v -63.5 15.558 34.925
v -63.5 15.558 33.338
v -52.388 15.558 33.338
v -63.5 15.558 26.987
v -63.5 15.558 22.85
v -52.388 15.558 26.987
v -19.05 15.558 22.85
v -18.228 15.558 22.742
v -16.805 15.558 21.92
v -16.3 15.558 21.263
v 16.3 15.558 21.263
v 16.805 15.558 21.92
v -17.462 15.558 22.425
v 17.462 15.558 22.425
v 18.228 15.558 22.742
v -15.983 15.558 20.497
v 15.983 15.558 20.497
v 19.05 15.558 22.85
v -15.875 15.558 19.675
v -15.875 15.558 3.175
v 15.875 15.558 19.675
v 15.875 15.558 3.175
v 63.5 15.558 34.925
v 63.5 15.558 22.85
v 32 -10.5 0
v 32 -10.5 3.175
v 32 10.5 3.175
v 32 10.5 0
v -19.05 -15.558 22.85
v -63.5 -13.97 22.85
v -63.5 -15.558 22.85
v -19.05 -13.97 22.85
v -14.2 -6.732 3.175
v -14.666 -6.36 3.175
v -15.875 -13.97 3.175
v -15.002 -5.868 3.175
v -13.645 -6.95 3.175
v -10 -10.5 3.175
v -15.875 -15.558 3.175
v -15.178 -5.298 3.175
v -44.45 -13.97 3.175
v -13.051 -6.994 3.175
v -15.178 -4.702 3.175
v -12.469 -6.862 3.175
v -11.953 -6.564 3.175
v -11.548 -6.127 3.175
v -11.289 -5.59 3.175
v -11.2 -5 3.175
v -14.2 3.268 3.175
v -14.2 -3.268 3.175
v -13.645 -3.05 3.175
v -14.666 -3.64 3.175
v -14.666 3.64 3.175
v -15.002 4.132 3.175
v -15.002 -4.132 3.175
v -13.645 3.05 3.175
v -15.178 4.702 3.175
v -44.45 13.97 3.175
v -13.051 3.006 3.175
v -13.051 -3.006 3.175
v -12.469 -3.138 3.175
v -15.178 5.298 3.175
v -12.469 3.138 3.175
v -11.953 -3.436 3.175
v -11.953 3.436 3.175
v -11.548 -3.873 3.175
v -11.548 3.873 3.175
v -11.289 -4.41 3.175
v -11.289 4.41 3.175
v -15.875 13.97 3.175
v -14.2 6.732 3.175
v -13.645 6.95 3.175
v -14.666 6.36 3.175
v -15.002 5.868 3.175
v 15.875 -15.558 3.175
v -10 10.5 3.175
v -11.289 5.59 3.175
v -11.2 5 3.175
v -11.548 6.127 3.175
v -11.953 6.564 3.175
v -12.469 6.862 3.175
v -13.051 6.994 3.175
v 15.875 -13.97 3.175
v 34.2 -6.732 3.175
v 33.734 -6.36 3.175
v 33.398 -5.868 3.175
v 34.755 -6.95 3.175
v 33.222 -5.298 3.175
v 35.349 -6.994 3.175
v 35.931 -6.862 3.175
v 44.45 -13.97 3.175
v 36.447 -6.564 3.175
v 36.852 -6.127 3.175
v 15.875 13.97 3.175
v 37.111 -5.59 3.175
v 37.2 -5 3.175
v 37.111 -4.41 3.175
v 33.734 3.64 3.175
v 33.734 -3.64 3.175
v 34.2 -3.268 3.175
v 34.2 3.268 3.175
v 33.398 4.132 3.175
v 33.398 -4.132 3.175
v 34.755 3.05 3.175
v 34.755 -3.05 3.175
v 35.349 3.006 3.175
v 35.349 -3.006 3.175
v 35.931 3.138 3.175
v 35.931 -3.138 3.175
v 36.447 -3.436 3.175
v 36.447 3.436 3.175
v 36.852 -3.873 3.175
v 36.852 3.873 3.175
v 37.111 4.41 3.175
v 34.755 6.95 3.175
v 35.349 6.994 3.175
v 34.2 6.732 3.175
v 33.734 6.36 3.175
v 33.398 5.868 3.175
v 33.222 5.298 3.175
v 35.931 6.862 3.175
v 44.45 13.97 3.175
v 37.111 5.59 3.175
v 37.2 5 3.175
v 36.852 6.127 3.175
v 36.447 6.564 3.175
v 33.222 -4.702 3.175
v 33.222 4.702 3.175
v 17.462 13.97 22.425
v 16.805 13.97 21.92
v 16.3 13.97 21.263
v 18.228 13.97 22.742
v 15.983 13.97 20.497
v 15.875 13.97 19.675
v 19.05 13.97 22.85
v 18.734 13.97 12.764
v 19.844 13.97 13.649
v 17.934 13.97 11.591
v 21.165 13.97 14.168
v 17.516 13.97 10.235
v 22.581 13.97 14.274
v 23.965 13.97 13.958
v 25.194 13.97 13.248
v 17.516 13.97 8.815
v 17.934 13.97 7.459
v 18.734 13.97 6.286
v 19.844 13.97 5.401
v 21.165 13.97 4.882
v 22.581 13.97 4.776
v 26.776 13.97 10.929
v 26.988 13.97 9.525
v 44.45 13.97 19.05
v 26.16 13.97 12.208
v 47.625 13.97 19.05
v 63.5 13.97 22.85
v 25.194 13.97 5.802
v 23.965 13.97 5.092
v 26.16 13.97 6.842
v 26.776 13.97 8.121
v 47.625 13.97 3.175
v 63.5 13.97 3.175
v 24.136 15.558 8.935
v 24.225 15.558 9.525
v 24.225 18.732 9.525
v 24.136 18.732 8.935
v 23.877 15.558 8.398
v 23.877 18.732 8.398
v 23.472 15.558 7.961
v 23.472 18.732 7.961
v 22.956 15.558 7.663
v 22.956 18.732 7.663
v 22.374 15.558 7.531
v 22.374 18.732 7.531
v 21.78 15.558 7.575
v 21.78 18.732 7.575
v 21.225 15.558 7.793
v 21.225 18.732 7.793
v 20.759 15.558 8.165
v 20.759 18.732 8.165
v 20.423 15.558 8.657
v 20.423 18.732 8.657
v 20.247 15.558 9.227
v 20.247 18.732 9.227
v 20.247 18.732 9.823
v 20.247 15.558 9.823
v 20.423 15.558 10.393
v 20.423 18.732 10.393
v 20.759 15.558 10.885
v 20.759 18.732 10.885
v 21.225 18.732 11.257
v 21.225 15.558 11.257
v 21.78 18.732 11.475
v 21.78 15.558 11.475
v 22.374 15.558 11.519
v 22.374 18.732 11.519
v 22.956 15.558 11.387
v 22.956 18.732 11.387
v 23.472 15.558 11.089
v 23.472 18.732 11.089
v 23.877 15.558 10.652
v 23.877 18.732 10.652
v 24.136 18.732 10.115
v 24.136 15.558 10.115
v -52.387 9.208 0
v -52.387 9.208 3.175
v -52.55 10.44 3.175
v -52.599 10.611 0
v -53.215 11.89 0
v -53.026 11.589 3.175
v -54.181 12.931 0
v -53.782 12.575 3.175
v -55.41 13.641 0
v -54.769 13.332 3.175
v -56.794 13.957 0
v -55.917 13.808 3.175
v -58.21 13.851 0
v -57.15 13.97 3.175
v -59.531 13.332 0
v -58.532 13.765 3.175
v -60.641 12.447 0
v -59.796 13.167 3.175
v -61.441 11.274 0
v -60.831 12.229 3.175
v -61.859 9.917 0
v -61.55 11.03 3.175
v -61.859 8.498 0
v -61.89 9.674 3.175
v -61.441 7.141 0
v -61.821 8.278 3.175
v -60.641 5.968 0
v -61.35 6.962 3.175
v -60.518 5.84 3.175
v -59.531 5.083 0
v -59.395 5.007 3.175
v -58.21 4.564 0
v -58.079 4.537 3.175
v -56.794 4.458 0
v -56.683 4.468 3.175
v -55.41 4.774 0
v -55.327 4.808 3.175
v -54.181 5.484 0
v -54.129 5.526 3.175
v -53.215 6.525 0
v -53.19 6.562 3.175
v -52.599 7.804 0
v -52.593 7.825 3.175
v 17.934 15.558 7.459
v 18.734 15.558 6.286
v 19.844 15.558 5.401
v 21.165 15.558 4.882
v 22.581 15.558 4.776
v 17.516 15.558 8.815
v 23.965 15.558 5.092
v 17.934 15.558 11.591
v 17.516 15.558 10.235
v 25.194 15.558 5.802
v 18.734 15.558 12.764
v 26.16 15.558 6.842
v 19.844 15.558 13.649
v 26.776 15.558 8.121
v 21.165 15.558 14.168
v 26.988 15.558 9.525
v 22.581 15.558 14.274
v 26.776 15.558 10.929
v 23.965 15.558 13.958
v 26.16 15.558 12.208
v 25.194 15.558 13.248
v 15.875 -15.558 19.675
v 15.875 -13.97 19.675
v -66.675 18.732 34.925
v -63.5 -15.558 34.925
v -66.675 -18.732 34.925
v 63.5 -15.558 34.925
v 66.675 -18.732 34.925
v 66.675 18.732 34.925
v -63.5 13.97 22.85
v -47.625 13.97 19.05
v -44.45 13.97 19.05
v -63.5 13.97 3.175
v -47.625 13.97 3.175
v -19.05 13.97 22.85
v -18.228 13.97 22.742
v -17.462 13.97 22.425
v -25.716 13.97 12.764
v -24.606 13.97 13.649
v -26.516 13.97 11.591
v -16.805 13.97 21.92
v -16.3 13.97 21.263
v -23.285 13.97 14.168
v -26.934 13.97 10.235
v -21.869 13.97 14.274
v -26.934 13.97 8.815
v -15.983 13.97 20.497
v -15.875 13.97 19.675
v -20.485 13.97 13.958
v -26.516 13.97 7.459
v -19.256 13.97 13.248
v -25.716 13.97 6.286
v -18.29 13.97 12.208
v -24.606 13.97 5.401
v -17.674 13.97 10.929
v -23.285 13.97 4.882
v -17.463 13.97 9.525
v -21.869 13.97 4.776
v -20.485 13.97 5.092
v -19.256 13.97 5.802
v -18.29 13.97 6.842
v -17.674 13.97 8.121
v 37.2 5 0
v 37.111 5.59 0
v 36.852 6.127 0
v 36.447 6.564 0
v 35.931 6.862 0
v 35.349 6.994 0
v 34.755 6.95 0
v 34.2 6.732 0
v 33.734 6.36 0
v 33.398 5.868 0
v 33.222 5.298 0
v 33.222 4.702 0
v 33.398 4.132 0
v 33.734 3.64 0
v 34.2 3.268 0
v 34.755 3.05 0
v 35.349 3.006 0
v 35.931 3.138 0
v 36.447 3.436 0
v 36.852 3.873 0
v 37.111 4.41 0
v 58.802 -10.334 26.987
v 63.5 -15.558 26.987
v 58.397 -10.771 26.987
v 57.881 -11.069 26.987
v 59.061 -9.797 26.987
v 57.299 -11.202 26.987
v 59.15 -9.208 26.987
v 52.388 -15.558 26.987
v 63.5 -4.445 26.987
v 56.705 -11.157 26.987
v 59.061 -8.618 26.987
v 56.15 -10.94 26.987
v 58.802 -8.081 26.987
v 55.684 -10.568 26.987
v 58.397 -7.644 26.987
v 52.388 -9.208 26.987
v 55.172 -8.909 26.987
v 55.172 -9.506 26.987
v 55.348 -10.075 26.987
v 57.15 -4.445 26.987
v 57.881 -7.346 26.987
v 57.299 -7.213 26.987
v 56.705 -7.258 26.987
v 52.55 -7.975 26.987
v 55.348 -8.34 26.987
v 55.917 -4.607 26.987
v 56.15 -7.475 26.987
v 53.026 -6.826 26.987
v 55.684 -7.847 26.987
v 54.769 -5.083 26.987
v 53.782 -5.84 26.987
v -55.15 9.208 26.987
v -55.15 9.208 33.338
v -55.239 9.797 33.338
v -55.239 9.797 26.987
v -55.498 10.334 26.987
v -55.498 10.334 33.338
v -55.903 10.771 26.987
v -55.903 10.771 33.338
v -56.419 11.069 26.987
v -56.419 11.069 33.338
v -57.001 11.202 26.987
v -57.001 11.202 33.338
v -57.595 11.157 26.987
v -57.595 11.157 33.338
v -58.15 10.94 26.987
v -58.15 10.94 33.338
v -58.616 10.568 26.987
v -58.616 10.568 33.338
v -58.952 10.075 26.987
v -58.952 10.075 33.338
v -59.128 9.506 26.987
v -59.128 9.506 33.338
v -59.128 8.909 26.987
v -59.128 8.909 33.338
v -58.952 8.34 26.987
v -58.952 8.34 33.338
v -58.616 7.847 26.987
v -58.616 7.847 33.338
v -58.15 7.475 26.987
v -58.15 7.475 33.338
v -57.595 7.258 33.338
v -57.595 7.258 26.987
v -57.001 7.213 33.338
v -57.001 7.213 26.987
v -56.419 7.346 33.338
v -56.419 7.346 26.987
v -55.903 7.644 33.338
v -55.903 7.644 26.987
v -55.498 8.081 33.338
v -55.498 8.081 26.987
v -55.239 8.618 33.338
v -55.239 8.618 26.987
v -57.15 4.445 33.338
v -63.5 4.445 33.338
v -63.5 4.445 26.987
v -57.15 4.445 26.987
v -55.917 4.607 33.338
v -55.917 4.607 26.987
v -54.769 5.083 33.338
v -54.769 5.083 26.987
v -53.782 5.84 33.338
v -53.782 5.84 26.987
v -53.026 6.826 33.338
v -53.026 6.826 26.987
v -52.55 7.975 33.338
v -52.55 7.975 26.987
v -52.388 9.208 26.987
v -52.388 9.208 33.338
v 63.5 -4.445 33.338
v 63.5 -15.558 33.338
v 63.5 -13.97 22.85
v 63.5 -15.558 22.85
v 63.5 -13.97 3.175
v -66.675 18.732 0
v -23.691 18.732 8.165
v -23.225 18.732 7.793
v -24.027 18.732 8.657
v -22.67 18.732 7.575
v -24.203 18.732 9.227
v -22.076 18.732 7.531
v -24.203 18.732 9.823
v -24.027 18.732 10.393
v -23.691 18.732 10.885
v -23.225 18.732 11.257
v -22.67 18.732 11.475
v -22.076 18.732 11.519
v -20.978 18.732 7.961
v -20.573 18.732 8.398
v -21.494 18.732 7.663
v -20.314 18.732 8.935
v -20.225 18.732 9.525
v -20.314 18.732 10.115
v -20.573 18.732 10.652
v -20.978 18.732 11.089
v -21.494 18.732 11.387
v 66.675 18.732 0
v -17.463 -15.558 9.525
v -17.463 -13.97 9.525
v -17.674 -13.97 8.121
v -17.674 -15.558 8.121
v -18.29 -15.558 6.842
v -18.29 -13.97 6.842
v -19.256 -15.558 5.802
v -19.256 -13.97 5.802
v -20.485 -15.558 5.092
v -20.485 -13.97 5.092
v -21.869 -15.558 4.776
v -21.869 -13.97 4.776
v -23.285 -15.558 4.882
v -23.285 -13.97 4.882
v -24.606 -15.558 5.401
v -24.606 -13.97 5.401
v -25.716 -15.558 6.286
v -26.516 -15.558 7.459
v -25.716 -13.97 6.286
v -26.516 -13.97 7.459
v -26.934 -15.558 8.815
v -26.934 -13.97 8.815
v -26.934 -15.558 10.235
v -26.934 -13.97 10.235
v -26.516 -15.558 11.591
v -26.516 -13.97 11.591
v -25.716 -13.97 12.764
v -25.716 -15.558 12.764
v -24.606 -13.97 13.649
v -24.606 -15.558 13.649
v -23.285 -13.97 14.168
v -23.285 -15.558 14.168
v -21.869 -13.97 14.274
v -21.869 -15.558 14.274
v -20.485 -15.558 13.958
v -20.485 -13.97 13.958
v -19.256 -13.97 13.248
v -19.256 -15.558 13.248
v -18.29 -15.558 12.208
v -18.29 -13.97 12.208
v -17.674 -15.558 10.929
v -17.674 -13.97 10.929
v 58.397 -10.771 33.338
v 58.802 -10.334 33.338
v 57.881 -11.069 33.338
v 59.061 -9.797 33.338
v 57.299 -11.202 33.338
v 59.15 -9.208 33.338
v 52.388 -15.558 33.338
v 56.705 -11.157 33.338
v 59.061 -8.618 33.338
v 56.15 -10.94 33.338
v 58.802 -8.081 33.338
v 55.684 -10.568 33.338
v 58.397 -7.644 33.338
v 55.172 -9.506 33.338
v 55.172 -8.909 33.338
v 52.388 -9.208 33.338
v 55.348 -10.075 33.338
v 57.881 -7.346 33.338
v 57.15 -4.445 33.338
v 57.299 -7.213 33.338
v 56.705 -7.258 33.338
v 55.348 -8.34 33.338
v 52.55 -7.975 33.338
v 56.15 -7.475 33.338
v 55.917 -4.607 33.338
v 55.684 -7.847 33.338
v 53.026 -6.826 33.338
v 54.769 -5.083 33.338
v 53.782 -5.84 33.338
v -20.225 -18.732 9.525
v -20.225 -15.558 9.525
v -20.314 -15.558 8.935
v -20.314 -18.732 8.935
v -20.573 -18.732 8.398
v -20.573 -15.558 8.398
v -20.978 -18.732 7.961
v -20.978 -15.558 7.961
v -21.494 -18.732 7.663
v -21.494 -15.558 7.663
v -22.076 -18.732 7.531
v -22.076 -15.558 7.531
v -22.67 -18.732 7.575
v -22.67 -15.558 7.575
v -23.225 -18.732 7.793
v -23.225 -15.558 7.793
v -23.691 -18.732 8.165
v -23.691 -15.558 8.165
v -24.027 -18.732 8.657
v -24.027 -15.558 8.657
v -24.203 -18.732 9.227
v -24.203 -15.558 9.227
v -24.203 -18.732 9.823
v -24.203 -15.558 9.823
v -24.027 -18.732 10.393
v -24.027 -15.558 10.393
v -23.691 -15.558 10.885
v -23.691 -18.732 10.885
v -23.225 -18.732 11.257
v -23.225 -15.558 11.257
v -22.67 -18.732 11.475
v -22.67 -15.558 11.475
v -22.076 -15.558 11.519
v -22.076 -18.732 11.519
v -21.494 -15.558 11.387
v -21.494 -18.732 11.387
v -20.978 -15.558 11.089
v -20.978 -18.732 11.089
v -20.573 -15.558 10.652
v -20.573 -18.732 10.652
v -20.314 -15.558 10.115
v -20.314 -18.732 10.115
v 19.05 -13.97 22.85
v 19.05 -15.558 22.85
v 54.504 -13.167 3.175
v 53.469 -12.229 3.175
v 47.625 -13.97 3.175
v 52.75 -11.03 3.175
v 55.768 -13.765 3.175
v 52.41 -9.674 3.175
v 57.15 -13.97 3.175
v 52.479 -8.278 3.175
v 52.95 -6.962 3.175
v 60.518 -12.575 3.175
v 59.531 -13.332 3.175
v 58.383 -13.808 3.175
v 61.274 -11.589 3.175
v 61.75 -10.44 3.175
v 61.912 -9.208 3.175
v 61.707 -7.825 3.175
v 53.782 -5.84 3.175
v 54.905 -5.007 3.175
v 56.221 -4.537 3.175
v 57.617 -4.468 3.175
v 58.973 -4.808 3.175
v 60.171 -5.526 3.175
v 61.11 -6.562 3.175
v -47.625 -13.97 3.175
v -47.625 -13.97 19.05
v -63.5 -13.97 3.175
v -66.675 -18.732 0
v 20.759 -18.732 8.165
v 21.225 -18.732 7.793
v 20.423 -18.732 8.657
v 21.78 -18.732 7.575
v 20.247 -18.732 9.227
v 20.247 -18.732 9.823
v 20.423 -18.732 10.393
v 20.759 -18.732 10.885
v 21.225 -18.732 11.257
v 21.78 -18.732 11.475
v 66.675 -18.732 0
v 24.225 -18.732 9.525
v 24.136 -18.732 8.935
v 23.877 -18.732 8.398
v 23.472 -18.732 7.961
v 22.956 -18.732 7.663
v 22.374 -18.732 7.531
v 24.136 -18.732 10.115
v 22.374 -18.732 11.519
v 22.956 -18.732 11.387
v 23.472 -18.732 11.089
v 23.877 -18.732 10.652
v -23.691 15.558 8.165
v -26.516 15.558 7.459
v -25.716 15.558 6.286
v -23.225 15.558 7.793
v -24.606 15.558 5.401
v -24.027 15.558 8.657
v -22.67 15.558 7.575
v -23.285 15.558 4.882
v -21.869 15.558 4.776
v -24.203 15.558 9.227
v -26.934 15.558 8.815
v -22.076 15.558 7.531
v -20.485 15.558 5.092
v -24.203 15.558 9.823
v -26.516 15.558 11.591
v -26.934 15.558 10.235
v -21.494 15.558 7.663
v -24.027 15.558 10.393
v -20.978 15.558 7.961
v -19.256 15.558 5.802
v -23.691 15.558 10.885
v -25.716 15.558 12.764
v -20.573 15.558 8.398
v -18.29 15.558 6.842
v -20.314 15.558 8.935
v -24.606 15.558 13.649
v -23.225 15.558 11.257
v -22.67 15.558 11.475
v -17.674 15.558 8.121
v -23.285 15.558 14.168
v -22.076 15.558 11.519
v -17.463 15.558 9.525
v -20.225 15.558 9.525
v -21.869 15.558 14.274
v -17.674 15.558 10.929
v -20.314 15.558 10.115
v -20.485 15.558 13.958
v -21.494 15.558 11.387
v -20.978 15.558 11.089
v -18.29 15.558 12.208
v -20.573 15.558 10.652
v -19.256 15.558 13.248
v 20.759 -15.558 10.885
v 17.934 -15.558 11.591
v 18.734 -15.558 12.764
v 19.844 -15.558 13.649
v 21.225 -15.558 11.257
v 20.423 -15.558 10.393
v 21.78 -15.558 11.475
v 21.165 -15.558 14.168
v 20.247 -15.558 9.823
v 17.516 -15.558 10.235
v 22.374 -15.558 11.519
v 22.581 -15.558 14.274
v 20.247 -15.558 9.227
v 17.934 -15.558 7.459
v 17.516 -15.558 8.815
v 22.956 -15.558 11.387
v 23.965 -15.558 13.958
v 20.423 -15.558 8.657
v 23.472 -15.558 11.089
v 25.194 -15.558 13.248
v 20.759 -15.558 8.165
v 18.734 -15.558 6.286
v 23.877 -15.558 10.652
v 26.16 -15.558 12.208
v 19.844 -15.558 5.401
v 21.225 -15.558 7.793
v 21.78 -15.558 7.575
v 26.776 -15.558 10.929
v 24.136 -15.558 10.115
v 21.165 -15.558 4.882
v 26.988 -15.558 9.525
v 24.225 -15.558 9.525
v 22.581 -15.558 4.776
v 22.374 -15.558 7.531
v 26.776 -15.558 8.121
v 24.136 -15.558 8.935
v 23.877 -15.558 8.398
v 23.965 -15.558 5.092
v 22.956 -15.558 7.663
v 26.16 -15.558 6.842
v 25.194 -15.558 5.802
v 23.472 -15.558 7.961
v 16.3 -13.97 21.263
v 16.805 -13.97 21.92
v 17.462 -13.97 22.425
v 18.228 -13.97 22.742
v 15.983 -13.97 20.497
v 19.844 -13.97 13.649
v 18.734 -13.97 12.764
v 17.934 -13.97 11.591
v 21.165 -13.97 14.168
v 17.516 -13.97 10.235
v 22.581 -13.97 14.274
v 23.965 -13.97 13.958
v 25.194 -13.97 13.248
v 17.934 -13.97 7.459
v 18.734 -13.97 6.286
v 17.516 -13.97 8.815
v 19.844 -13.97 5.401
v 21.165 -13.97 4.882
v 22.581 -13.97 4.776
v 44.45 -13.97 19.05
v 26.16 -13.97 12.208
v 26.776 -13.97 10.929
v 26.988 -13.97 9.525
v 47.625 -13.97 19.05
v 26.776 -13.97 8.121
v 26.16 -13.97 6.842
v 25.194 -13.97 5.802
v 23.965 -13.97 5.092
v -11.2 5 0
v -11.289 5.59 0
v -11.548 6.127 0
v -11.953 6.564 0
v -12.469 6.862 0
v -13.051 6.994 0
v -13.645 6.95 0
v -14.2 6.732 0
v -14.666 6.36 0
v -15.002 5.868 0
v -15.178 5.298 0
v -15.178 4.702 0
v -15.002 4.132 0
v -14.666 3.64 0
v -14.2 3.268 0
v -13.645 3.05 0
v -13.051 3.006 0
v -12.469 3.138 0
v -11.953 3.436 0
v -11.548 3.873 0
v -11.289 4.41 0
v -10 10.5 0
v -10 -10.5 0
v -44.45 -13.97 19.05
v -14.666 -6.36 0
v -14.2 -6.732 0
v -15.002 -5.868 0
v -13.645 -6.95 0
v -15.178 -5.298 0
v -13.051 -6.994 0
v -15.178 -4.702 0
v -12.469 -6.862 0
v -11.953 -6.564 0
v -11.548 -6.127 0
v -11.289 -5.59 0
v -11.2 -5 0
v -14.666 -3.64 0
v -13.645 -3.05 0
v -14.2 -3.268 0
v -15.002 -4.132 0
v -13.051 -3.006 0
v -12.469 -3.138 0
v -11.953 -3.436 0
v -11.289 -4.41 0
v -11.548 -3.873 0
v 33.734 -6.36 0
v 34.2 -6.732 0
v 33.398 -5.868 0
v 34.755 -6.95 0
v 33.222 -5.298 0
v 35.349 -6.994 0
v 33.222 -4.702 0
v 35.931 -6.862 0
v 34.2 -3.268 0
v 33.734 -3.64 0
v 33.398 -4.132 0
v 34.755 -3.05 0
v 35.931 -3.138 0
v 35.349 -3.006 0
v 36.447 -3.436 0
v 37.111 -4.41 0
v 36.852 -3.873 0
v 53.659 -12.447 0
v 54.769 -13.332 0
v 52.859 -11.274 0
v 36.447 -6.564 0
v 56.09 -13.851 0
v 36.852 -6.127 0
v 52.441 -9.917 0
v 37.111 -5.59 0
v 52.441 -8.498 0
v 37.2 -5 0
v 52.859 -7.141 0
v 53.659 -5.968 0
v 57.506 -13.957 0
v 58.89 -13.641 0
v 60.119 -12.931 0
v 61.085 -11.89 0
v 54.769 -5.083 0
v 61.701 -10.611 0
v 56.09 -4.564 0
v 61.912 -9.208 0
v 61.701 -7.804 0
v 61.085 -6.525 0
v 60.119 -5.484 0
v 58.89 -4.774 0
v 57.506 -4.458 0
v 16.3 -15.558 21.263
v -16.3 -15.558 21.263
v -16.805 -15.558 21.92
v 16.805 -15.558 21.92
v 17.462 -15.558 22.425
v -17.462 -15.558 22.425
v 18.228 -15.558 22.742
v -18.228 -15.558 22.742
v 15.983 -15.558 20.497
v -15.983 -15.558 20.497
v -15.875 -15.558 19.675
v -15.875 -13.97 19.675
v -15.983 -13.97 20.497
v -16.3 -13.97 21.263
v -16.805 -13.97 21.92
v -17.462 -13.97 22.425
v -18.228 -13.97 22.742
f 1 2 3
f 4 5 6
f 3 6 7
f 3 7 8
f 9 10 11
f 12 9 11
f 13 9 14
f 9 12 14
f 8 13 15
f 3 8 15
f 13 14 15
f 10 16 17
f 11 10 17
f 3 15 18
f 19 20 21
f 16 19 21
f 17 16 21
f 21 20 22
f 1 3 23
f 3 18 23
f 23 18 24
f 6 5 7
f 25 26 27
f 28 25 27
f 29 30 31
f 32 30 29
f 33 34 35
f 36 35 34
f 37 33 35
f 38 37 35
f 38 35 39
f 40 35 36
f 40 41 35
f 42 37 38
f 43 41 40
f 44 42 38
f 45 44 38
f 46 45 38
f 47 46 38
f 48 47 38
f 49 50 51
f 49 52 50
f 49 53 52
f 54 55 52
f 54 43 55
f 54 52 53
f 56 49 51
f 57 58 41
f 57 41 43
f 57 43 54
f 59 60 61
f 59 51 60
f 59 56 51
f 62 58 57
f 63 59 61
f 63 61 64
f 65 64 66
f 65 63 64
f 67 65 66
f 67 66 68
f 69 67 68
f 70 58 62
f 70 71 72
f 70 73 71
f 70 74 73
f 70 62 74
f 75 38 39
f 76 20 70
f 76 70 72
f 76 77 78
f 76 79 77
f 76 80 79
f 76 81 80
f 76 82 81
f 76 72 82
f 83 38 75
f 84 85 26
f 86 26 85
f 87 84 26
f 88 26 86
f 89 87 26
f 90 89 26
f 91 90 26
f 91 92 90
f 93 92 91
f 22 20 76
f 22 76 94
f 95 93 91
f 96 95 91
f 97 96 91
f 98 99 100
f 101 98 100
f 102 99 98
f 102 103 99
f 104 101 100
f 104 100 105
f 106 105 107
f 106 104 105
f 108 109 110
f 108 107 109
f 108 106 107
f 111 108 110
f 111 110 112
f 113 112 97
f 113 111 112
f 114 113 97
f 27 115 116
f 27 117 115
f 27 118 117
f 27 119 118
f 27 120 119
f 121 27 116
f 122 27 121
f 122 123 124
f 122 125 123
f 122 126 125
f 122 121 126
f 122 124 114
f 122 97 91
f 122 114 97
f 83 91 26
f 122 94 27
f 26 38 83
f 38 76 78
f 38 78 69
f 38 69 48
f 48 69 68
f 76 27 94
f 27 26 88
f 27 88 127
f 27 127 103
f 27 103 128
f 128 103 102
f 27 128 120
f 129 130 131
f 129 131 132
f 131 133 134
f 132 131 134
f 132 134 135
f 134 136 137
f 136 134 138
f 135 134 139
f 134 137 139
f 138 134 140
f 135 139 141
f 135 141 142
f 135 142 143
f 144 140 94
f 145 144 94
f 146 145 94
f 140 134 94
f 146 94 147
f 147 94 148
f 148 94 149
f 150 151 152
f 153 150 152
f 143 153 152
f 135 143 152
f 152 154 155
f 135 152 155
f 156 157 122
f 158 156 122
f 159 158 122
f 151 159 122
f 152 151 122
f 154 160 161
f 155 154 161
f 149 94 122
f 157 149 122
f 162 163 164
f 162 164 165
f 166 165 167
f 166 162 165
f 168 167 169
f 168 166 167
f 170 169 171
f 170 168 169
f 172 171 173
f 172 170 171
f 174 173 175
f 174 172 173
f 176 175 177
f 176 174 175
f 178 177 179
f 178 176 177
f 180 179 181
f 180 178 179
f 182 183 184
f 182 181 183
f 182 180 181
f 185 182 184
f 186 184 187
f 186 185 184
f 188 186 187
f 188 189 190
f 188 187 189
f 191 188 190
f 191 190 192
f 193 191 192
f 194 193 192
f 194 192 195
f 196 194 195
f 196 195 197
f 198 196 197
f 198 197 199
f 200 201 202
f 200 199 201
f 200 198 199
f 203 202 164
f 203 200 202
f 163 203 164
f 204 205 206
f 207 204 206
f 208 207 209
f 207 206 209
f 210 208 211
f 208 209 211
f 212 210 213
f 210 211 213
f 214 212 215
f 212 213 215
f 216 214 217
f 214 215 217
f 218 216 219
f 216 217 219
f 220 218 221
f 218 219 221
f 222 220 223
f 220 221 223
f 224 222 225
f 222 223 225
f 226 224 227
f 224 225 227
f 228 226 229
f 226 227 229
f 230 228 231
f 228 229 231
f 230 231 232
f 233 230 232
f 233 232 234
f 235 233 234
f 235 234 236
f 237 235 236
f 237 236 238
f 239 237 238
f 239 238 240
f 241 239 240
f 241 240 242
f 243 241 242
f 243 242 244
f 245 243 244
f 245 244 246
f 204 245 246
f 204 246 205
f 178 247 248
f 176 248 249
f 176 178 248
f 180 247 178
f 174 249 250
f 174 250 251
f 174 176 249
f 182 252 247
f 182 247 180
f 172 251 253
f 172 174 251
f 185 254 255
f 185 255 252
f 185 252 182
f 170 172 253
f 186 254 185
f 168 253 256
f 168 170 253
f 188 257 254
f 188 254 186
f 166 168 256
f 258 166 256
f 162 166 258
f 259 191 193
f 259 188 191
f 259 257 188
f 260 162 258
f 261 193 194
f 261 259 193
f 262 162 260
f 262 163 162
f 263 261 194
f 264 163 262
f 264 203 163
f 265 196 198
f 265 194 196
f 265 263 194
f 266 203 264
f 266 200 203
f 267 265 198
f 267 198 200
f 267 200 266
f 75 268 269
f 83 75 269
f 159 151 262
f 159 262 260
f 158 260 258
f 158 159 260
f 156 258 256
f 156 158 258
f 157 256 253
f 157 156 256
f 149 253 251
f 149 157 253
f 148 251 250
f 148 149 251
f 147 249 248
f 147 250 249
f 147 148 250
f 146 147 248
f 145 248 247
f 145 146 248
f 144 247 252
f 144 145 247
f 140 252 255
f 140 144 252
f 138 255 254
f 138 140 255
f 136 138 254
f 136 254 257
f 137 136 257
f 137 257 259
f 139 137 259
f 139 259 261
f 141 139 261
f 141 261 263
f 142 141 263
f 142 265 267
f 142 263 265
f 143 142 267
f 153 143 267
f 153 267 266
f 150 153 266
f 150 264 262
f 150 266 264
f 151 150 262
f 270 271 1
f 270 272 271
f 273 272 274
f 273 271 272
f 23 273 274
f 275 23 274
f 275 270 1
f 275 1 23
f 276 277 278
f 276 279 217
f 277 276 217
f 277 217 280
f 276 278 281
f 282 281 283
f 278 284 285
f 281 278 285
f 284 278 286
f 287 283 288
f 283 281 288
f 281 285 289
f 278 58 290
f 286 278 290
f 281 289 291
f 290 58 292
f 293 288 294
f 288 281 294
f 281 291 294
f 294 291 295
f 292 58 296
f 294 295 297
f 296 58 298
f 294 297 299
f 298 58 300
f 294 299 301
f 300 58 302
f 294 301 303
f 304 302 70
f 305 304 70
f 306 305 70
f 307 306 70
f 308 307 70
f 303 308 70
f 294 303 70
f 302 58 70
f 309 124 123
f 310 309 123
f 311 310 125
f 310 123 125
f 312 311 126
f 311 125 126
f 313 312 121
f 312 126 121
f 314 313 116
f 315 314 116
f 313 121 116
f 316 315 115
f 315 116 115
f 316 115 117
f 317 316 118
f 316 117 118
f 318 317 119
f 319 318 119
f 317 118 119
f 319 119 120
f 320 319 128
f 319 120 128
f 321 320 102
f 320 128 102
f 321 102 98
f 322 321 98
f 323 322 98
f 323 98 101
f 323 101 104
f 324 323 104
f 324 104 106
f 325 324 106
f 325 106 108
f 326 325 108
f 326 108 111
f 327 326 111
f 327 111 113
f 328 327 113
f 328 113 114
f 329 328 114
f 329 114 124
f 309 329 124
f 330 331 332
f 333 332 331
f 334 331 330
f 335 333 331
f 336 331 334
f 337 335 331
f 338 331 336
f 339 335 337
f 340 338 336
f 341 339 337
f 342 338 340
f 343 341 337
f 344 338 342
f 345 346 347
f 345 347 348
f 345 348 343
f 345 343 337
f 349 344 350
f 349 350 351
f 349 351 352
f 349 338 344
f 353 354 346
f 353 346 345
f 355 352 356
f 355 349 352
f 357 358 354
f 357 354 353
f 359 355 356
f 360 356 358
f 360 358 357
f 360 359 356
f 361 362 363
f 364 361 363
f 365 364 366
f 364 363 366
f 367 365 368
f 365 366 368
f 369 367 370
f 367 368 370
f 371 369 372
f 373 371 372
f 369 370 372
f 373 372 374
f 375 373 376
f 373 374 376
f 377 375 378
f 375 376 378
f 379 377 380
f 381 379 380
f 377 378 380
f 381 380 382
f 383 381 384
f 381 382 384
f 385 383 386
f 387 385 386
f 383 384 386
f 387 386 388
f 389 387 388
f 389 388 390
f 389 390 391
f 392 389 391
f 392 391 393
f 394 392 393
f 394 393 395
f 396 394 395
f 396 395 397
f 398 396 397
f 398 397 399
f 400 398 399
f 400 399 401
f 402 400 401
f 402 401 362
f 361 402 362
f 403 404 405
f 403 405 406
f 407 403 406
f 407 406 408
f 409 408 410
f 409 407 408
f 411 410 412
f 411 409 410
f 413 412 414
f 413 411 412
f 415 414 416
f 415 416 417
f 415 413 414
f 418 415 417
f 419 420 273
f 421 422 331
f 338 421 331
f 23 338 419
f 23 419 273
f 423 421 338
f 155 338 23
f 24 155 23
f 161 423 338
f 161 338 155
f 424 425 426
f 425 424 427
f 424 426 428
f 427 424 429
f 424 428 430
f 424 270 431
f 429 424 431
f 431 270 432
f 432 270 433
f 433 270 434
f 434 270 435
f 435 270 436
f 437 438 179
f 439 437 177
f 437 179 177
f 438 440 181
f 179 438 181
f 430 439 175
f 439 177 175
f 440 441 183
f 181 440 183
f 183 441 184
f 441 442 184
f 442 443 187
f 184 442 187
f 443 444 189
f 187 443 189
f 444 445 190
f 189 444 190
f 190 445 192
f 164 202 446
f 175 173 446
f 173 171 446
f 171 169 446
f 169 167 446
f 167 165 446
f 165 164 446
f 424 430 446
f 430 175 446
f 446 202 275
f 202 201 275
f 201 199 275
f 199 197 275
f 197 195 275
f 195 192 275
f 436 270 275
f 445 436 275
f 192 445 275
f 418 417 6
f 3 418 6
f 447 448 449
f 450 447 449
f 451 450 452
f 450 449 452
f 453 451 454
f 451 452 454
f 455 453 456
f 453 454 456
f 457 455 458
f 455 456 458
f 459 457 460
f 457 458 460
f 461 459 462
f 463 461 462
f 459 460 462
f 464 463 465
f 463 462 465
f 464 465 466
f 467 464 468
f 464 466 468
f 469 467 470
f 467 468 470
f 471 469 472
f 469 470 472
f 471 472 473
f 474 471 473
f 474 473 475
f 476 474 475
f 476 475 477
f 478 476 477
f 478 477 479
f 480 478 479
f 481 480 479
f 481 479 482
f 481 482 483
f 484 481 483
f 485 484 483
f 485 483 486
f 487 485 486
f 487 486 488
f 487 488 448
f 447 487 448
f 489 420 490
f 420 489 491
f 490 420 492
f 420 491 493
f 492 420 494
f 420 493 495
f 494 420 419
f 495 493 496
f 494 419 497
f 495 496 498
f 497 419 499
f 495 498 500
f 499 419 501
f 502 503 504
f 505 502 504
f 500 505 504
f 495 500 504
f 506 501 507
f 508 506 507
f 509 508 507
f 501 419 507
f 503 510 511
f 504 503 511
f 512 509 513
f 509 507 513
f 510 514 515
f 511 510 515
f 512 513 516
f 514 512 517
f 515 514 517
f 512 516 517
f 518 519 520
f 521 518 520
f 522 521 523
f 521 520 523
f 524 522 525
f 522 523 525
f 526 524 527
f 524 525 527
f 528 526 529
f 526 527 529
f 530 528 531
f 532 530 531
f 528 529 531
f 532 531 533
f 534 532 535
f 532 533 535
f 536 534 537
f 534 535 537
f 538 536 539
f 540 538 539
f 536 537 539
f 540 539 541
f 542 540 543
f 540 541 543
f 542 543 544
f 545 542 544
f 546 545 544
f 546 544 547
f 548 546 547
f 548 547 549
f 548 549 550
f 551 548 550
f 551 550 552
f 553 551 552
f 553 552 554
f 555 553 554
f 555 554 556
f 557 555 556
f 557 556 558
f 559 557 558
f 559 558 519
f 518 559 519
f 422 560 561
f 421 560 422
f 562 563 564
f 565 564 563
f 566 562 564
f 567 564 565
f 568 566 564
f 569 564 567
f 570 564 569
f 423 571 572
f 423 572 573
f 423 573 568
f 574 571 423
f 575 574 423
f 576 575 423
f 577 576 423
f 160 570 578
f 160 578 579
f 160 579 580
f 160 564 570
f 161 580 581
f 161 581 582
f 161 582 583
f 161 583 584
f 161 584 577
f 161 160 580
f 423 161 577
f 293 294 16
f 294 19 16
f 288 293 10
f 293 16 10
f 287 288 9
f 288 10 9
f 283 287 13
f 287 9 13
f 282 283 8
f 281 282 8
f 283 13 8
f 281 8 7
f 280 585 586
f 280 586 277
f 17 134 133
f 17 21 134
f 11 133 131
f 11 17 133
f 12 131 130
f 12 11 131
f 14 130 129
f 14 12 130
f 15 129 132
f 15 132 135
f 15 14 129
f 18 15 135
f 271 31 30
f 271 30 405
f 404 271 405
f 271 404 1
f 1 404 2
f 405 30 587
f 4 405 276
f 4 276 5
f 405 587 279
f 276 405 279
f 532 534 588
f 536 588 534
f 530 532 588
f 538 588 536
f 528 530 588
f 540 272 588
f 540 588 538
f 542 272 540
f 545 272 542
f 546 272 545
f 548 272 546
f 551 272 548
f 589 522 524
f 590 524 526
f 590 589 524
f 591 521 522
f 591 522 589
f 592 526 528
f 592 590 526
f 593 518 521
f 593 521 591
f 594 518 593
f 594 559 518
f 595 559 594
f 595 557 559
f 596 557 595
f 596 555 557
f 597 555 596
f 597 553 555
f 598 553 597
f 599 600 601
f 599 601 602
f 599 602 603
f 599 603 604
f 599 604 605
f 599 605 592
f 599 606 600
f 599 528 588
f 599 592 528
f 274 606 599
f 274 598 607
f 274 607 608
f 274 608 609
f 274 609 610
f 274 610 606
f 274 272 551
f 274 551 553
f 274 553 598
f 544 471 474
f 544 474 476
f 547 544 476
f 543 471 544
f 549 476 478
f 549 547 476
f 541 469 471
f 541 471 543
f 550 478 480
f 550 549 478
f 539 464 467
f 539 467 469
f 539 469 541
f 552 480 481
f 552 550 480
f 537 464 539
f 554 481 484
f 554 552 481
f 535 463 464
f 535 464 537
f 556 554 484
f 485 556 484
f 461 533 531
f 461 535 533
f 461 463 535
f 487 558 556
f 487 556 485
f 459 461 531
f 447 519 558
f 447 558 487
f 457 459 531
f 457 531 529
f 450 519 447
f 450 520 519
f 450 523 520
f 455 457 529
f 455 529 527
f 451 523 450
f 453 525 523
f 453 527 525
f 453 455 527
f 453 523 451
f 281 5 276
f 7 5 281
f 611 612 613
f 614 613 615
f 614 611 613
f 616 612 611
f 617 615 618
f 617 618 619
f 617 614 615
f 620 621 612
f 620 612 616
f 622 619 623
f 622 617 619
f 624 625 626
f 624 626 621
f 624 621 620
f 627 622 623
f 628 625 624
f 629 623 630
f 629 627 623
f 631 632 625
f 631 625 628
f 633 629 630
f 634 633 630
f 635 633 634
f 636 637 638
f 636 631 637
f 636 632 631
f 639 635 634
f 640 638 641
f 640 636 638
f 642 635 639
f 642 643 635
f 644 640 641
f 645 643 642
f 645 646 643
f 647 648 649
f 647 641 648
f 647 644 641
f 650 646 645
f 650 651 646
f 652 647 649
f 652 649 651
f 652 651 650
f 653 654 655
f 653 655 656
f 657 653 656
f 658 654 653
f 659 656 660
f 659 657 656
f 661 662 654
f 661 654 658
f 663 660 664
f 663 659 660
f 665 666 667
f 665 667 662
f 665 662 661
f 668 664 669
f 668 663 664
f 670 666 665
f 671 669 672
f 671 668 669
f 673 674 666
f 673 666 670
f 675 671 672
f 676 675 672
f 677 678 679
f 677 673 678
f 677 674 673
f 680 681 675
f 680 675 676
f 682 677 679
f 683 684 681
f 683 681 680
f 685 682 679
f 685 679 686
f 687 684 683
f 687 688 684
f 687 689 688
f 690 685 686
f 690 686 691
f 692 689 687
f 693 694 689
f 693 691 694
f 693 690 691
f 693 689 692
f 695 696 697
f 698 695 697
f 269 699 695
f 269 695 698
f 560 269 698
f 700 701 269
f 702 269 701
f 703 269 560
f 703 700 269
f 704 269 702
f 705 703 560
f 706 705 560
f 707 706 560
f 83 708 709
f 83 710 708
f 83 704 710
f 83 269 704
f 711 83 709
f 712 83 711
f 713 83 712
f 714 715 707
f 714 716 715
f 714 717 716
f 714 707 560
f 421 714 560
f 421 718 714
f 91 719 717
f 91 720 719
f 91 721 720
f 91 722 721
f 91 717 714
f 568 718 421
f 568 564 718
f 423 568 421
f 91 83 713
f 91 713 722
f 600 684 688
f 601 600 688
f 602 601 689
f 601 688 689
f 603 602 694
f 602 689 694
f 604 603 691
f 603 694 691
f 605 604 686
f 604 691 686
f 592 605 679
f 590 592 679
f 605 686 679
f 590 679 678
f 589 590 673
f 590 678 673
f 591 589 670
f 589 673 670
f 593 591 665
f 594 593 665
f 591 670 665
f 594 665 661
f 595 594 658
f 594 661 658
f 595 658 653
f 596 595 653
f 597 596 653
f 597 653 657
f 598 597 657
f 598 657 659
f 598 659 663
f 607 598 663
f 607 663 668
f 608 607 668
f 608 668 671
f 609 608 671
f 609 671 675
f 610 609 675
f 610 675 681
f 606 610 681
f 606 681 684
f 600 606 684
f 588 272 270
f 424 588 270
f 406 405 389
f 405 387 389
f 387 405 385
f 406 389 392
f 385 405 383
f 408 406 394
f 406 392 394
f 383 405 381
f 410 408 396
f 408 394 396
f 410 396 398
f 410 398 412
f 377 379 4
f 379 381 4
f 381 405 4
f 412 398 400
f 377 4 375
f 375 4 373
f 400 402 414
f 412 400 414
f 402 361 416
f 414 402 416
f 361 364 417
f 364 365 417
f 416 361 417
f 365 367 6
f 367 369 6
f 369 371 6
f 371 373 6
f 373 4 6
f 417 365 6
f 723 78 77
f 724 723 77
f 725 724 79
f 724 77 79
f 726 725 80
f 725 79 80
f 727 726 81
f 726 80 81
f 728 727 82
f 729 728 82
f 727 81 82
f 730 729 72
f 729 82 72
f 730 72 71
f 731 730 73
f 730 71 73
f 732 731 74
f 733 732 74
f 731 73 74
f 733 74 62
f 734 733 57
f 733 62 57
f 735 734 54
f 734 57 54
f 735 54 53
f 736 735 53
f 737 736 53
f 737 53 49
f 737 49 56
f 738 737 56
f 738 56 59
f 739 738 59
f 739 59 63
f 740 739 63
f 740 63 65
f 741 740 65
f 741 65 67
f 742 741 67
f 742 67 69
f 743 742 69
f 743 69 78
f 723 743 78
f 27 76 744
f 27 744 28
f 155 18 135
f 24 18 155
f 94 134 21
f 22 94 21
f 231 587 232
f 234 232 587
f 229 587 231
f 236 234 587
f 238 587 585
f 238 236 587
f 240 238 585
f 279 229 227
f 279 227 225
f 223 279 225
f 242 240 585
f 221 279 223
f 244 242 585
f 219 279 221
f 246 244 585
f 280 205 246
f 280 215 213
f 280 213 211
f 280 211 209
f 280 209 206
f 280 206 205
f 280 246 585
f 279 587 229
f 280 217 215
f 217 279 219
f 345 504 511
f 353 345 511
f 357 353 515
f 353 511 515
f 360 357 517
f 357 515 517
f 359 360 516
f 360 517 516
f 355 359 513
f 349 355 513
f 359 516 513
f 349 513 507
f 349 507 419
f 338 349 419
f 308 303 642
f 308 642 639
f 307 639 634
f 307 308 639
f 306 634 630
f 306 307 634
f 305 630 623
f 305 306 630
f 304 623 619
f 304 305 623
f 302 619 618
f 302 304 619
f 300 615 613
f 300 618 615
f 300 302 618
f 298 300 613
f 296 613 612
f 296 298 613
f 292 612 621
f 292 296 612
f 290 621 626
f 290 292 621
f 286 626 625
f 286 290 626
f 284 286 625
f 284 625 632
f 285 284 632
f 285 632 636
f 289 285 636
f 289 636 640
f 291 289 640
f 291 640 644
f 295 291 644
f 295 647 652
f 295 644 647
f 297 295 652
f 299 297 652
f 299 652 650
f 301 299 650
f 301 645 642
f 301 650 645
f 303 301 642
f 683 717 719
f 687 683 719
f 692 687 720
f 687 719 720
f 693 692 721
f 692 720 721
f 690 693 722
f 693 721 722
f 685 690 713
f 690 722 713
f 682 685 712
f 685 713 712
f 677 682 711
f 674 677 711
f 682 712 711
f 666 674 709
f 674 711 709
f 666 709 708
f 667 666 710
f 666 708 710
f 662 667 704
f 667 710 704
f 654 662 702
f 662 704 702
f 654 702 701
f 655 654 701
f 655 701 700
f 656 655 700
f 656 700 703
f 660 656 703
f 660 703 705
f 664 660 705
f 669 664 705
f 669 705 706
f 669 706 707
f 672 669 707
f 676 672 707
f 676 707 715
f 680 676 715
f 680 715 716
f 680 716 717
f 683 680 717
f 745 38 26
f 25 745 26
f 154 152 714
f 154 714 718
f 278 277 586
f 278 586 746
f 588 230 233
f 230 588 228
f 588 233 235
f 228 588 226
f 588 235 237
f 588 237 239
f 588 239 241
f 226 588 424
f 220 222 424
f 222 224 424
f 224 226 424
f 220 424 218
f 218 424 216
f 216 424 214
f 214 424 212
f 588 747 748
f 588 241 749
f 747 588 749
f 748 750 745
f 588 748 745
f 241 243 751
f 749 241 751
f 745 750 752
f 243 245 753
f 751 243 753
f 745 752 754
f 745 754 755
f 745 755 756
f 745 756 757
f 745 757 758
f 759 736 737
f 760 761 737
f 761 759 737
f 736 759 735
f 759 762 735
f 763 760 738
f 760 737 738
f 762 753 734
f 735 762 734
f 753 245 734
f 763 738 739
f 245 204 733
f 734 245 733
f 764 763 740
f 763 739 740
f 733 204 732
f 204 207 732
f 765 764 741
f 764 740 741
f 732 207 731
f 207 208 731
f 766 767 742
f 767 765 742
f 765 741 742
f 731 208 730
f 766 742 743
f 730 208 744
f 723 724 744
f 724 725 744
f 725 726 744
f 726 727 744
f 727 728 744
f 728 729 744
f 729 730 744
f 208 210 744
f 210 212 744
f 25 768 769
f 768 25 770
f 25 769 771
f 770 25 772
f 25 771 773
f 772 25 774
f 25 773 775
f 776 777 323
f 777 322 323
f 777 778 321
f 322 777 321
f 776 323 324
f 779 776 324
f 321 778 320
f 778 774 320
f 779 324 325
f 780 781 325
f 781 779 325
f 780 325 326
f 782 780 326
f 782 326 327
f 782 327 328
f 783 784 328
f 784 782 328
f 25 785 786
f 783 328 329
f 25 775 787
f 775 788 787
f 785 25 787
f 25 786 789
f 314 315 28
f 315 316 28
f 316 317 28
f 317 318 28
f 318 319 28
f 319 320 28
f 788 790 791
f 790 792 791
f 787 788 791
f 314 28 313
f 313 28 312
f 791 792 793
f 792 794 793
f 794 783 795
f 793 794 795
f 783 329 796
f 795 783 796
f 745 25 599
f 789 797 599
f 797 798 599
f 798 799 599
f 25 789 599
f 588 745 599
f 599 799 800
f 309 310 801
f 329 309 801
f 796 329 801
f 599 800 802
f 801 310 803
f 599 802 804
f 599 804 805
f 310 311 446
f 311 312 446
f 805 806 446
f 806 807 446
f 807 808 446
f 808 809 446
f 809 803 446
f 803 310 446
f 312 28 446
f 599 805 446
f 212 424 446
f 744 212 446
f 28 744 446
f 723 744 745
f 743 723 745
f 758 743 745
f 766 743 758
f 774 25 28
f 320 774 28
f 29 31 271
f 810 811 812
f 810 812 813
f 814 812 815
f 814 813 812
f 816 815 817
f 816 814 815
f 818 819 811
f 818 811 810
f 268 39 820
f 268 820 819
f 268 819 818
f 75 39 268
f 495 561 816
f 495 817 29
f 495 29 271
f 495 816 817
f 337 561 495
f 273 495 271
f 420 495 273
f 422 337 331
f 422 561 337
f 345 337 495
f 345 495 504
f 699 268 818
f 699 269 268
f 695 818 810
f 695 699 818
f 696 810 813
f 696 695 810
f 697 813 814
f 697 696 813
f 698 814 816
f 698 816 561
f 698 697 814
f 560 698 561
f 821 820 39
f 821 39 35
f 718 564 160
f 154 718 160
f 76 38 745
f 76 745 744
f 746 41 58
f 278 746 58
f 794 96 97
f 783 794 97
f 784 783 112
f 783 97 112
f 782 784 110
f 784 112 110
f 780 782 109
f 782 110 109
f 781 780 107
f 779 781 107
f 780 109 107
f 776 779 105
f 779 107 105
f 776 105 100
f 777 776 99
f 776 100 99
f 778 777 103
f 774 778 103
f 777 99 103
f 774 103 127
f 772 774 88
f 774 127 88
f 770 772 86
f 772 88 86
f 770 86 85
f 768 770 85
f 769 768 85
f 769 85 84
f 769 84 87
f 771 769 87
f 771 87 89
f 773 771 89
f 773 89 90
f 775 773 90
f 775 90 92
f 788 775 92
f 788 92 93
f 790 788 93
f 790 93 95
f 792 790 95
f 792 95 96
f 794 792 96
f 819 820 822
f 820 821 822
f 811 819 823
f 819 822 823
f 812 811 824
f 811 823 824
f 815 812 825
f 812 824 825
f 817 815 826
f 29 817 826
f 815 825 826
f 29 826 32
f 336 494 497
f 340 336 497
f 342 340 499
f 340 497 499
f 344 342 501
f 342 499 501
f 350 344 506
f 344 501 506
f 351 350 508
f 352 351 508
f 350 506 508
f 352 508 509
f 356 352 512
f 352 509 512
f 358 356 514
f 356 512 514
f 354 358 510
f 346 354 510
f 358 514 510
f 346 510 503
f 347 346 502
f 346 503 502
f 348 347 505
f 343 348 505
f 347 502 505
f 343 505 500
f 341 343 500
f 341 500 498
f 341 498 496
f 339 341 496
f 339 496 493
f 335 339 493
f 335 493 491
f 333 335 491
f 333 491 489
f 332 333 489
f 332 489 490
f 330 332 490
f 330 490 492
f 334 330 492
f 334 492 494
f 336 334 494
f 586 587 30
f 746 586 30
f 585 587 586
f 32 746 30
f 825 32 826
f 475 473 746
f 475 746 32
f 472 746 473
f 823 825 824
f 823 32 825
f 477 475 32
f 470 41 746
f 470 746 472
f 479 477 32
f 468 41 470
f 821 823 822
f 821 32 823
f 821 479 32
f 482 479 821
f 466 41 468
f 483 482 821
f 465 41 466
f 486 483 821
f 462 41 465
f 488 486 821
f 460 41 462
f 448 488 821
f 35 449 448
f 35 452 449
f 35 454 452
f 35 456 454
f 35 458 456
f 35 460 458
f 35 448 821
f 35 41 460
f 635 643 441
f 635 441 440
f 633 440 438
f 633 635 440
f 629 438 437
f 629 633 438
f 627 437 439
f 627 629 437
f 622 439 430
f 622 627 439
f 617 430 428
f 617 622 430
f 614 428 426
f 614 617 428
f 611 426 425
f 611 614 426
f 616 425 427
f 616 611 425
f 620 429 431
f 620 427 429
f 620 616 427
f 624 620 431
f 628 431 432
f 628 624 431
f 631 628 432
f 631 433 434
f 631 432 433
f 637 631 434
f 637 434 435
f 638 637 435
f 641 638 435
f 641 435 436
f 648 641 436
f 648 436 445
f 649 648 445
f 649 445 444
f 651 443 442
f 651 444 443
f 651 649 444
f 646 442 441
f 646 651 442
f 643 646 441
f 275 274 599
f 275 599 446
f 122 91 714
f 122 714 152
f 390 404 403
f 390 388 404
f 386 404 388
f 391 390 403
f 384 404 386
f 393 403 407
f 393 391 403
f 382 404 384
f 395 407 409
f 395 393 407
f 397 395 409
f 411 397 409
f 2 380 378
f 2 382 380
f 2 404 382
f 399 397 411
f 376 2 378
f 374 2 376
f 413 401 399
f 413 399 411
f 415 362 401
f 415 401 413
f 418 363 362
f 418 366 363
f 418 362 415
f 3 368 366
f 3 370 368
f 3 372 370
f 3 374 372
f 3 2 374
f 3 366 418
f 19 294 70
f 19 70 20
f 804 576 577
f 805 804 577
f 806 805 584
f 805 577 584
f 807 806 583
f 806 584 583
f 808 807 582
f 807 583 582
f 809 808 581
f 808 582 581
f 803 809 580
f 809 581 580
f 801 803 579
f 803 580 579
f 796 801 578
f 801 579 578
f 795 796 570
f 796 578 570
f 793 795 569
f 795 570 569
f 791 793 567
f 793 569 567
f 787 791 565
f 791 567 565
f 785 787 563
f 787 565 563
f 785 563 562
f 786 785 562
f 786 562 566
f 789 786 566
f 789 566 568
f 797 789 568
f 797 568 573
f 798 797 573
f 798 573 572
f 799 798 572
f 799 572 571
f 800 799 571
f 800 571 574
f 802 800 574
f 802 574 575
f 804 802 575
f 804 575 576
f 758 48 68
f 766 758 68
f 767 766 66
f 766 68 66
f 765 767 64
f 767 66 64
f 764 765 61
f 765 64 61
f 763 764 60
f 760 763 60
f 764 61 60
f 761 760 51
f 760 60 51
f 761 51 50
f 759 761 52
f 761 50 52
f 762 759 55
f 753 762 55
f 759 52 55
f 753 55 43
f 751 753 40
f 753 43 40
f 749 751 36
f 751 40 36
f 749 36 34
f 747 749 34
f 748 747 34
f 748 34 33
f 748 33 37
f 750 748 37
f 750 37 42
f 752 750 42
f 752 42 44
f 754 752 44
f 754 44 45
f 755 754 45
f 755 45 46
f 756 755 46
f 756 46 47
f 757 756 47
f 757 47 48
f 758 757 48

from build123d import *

# Parameters (mm, degrees)
SKETCH1_W                      = 127
SKETCH1_H                      = 31.115
BOSS_EXTRUDE1_DEPTH            = 3.175
CUT_EXTRUDE1_REACH             = 5.175
SKETCH2_R                      = 2
SKETCH2_W                      = 42
SKETCH2_H                      = 21
SKETCH3_W                      = 133.35
SKETCH3_H                      = 37.465
SKETCH3_W_2                    = 127
SKETCH3_H_2                    = 31.115
EXTRUDE_THIN1_DEPTH            = 31.75
EXTRUDE_THIN1_DEPTH_BACK       = 3.175
SKETCH4_W                      = 47.625
SKETCH4_H                      = 1.5875
BOSS_EXTRUDE2_DEPTH            = 19.67500002
CUT_EXTRUDE2_REACH             = 5.175
SKETCH6_R                      = 4.7625
BOSS_EXTRUDE4_START            = -1.5875
BOSS_EXTRUDE4_DEPTH            = 6.35
CUT_EXTRUDE3_REACH             = 36.925
SKETCH8_R                      = 2
SKETCH9_R                      = 2
CUT_EXTRUDE4_DEPTH             = 19.7325
CUT_EXTRUDE4_DEPTH_BACK        = 19.7325
SKETCH5_W                      = 3.175
SKETCH5_H                      = 27.94
BOSS_EXTRUDE3_DEPTH            = 15.875
FILLET1_R                      = 3.175
CUT_EXTRUDE5_REACH             = 20.733
SKETCH10_R                     = 4.7625
CUT_EXTRUDE5_DIRECTION_2_REACH = 20.733


with BuildPart() as part:
    # Sketch1 → Boss-Extrude1 (new body)
    with BuildSketch(Plane.XY):
        Rectangle(SKETCH1_W, SKETCH1_H)
    extrude(amount=BOSS_EXTRUDE1_DEPTH)

    # Sketch2 → Cut-Extrude1 (cut, up to next)
    with BuildSketch(Plane.XY.offset(3.175), mode=Mode.PRIVATE) as cut_extrude1_sk1:
        with Locations((-13.2, 5)):
            Circle(SKETCH2_R)
    cut_extrude1_tool1 = extrude(cut_extrude1_sk1.sketch, amount=-CUT_EXTRUDE1_REACH, mode=Mode.PRIVATE) & part.part
    add(cut_extrude1_tool1.solids().sort_by_distance((-13.2, 5, 3.175))[0], mode=Mode.SUBTRACT)
    # Sketch2 → Cut-Extrude1 (cut, up to next)
    with BuildSketch(Plane.XY.offset(3.175), mode=Mode.PRIVATE) as cut_extrude1_sk2:
        with Locations((-13.2, -5)):
            Circle(SKETCH2_R)
    cut_extrude1_tool2 = extrude(cut_extrude1_sk2.sketch, amount=-CUT_EXTRUDE1_REACH, mode=Mode.PRIVATE) & part.part
    add(cut_extrude1_tool2.solids().sort_by_distance((-13.2, -5, 3.175))[0], mode=Mode.SUBTRACT)
    # Sketch2 → Cut-Extrude1 (cut, up to next)
    with BuildSketch(Plane.XY.offset(3.175), mode=Mode.PRIVATE) as cut_extrude1_sk3:
        with Locations((35.2, 5)):
            Circle(SKETCH2_R)
    cut_extrude1_tool3 = extrude(cut_extrude1_sk3.sketch, amount=-CUT_EXTRUDE1_REACH, mode=Mode.PRIVATE) & part.part
    add(cut_extrude1_tool3.solids().sort_by_distance((35.2, 5, 3.175))[0], mode=Mode.SUBTRACT)
    # Sketch2 → Cut-Extrude1 (cut, up to next)
    with BuildSketch(Plane.XY.offset(3.175), mode=Mode.PRIVATE) as cut_extrude1_sk4:
        with Locations((35.2, -5)):
            Circle(SKETCH2_R)
    cut_extrude1_tool4 = extrude(cut_extrude1_sk4.sketch, amount=-CUT_EXTRUDE1_REACH, mode=Mode.PRIVATE) & part.part
    add(cut_extrude1_tool4.solids().sort_by_distance((35.2, -5, 3.175))[0], mode=Mode.SUBTRACT)
    # Sketch2 → Cut-Extrude1 (cut, up to next)
    with BuildSketch(Plane.XY.offset(3.175), mode=Mode.PRIVATE) as cut_extrude1_sk5:
        with Locations((11, 0)):
            Rectangle(SKETCH2_W, SKETCH2_H)
    cut_extrude1_tool5 = extrude(cut_extrude1_sk5.sketch, amount=-CUT_EXTRUDE1_REACH, mode=Mode.PRIVATE) & part.part
    add(cut_extrude1_tool5.solids().sort_by_distance((11, 0, 3.175))[0], mode=Mode.SUBTRACT)

    # Sketch3 → Extrude-Thin1 (add, two sides)
    with BuildSketch(Plane.XY.offset(3.175)) as extrude_thin1_sk:
        Rectangle(SKETCH3_W, SKETCH3_H)
        Rectangle(SKETCH3_W_2, SKETCH3_H_2, mode=Mode.SUBTRACT)
    extrude(amount=EXTRUDE_THIN1_DEPTH)
    extrude(extrude_thin1_sk.sketch, amount=-EXTRUDE_THIN1_DEPTH_BACK)

    # Sketch4 → Boss-Extrude2 (add)
    with BuildSketch(Plane.XY.offset(3.175)):
        with Locations((-39.6875, -14.76375)):
            Rectangle(SKETCH4_W, SKETCH4_H)
        with Locations((39.6875, -14.76375)):
            Rectangle(SKETCH4_W, SKETCH4_H)
        with Locations((-39.6875, 14.76375)):
            Rectangle(SKETCH4_W, SKETCH4_H)
        with Locations((39.6875, 14.76375)):
            Rectangle(SKETCH4_W, SKETCH4_H)
    extrude(amount=BOSS_EXTRUDE2_DEPTH)

    # Sketch6 → Cut-Extrude2 (cut, up to next)
    with BuildSketch(Plane.XY.offset(3.175), mode=Mode.PRIVATE) as cut_extrude2_sk1:
        with Locations((-57.15, 9.2075)):
            Circle(SKETCH6_R)
    cut_extrude2_tool1 = extrude(cut_extrude2_sk1.sketch, amount=-CUT_EXTRUDE2_REACH, mode=Mode.PRIVATE) & part.part
    add(cut_extrude2_tool1.solids().sort_by_distance((-57.15, 9.2075, 3.175))[0], mode=Mode.SUBTRACT)
    # Sketch6 → Cut-Extrude2 (cut, up to next)
    with BuildSketch(Plane.XY.offset(3.175), mode=Mode.PRIVATE) as cut_extrude2_sk2:
        with Locations((57.15, -9.2075)):
            Circle(SKETCH6_R)
    cut_extrude2_tool2 = extrude(cut_extrude2_sk2.sketch, amount=-CUT_EXTRUDE2_REACH, mode=Mode.PRIVATE) & part.part
    add(cut_extrude2_tool2.solids().sort_by_distance((57.15, -9.2075, 3.175))[0], mode=Mode.SUBTRACT)

    # Sketch7 → Boss-Extrude4 (add)
    with BuildSketch(Plane.XY.offset(34.925).offset(BOSS_EXTRUDE4_START)):
        with BuildLine():
            Line((-63.5, 15.5575), (-63.5, 4.445))
            Line((-63.5, 4.445), (-57.15, 4.445))
            ThreePointArc((-57.15, 4.445), (-53.782403955, 5.839903955), (-52.3875, 9.2075))
            Line((-52.3875, 9.2075), (-52.3875, 15.5575))
            Line((-52.3875, 15.5575), (-63.5, 15.5575))
        make_face()
        with BuildLine():
            Line((63.5, -15.5575), (52.3875, -15.5575))
            Line((52.3875, -15.5575), (52.3875, -9.2075))
            ThreePointArc((52.3875, -9.2075), (53.782403955, -5.839903955), (57.15, -4.445))
            Line((57.15, -4.445), (63.5, -4.445))
            Line((63.5, -4.445), (63.5, -15.5575))
        make_face()
    extrude(amount=-BOSS_EXTRUDE4_DEPTH)

    # Sketch8 → Cut-Extrude3 (cut, up to next)
    with BuildSketch(Plane.XY.offset(34.925), mode=Mode.PRIVATE) as cut_extrude3_sk1:
        with Locations((-57.15, 9.2075)):
            Circle(SKETCH8_R)
    cut_extrude3_tool1 = extrude(cut_extrude3_sk1.sketch, amount=-CUT_EXTRUDE3_REACH, mode=Mode.PRIVATE) & part.part
    add(cut_extrude3_tool1.solids().sort_by_distance((-57.15, 9.2075, 34.925))[0], mode=Mode.SUBTRACT)
    # Sketch8 → Cut-Extrude3 (cut, up to next)
    with BuildSketch(Plane.XY.offset(34.925), mode=Mode.PRIVATE) as cut_extrude3_sk2:
        with Locations((57.15, -9.2075)):
            Circle(SKETCH8_R)
    cut_extrude3_tool2 = extrude(cut_extrude3_sk2.sketch, amount=-CUT_EXTRUDE3_REACH, mode=Mode.PRIVATE) & part.part
    add(cut_extrude3_tool2.solids().sort_by_distance((57.15, -9.2075, 34.925))[0], mode=Mode.SUBTRACT)

    # Sketch9 → Cut-Extrude4 (cut, two sides)
    with BuildSketch(Plane(origin=(0, 0, 0), x_dir=(1, 0, 0), z_dir=(0, 1, 0))) as cut_extrude4_sk:
        with Locations((22.225, -9.525)):
            Circle(SKETCH9_R)
        with Locations((-22.225, -9.525)):
            Circle(SKETCH9_R)
    extrude(amount=CUT_EXTRUDE4_DEPTH, mode=Mode.SUBTRACT)
    extrude(cut_extrude4_sk.sketch, amount=-CUT_EXTRUDE4_DEPTH_BACK, mode=Mode.SUBTRACT)

    # Sketch5 → Boss-Extrude3 (add)
    with BuildSketch(Plane.XY.offset(3.175)):
        with Locations((46.0375, 0)):
            Rectangle(SKETCH5_W, SKETCH5_H)
        with Locations((-46.0375, 0)):
            Rectangle(SKETCH5_W, SKETCH5_H)
    extrude(amount=BOSS_EXTRUDE3_DEPTH)

    # Fillet1
    fillet1_edges = [part.edges().sort_by_distance(p)[0] for p in [
        (15.875, 14.76375, 22.85000002),
        (-15.875, -14.76375, 22.85000002),
        (15.875, -14.76375, 22.85000002),
        (-15.875, 14.76375, 22.85000002),
    ]]
    fillet(fillet1_edges, radius=FILLET1_R)

    # Cut-Extrude5: up to this face of the body (flat: up to its plane)
    cut_extrude5_end = Plane(part.part.faces().sort_by_distance((-1.954505757, -15.5575, 24.090116644))[0])
    # Sketch10 → Cut-Extrude5 (cut, up to the picked face)
    with BuildSketch(Plane(origin=(0, 0, 0), x_dir=(1, 0, 0), z_dir=(0, 1, 0)), mode=Mode.PRIVATE) as cut_extrude5_sk1:
        with Locations((-22.225, -9.525)):
            Circle(SKETCH10_R)
    cut_extrude5_tool1 = split(extrude(cut_extrude5_sk1.sketch, amount=-CUT_EXTRUDE5_REACH, mode=Mode.PRIVATE), bisect_by=cut_extrude5_end, keep=Keep.BOTH, mode=Mode.PRIVATE)
    add(cut_extrude5_tool1.solids().sort_by_distance((-22.225, 0, 9.525))[0], mode=Mode.SUBTRACT)
    # Sketch10 → Cut-Extrude5 (cut, up to the picked face)
    with BuildSketch(Plane(origin=(0, 0, 0), x_dir=(1, 0, 0), z_dir=(0, 1, 0)), mode=Mode.PRIVATE) as cut_extrude5_sk2:
        with Locations((22.225, -9.525)):
            Circle(SKETCH10_R)
    cut_extrude5_tool2 = split(extrude(cut_extrude5_sk2.sketch, amount=-CUT_EXTRUDE5_REACH, mode=Mode.PRIVATE), bisect_by=cut_extrude5_end, keep=Keep.BOTH, mode=Mode.PRIVATE)
    add(cut_extrude5_tool2.solids().sort_by_distance((22.225, 0, 9.525))[0], mode=Mode.SUBTRACT)

    # Cut-Extrude5 direction 2: up to this face of the body (flat: up to its plane)
    cut_extrude5_direction_2_end = Plane(part.part.faces().sort_by_distance((1.954505757, 15.5575, 24.090116644))[0])
    # Sketch10 → Cut-Extrude5 direction 2 (cut, up to the picked face)
    with BuildSketch(Plane(origin=(0, 0, 0), x_dir=(1, 0, 0), z_dir=(0, 1, 0)), mode=Mode.PRIVATE) as cut_extrude5_direction_2_sk1:
        with Locations((-22.225, -9.525)):
            Circle(SKETCH10_R)
    cut_extrude5_direction_2_tool1 = split(extrude(cut_extrude5_direction_2_sk1.sketch, amount=CUT_EXTRUDE5_DIRECTION_2_REACH, mode=Mode.PRIVATE), bisect_by=cut_extrude5_direction_2_end, keep=Keep.BOTH, mode=Mode.PRIVATE)
    add(cut_extrude5_direction_2_tool1.solids().sort_by_distance((-22.225, 0, 9.525))[0], mode=Mode.SUBTRACT)
    # Sketch10 → Cut-Extrude5 direction 2 (cut, up to the picked face)
    with BuildSketch(Plane(origin=(0, 0, 0), x_dir=(1, 0, 0), z_dir=(0, 1, 0)), mode=Mode.PRIVATE) as cut_extrude5_direction_2_sk2:
        with Locations((22.225, -9.525)):
            Circle(SKETCH10_R)
    cut_extrude5_direction_2_tool2 = split(extrude(cut_extrude5_direction_2_sk2.sketch, amount=CUT_EXTRUDE5_DIRECTION_2_REACH, mode=Mode.PRIVATE), bisect_by=cut_extrude5_direction_2_end, keep=Keep.BOTH, mode=Mode.PRIVATE)
    add(cut_extrude5_direction_2_tool2.solids().sort_by_distance((22.225, 0, 9.525))[0], mode=Mode.SUBTRACT)


solid = part.part
